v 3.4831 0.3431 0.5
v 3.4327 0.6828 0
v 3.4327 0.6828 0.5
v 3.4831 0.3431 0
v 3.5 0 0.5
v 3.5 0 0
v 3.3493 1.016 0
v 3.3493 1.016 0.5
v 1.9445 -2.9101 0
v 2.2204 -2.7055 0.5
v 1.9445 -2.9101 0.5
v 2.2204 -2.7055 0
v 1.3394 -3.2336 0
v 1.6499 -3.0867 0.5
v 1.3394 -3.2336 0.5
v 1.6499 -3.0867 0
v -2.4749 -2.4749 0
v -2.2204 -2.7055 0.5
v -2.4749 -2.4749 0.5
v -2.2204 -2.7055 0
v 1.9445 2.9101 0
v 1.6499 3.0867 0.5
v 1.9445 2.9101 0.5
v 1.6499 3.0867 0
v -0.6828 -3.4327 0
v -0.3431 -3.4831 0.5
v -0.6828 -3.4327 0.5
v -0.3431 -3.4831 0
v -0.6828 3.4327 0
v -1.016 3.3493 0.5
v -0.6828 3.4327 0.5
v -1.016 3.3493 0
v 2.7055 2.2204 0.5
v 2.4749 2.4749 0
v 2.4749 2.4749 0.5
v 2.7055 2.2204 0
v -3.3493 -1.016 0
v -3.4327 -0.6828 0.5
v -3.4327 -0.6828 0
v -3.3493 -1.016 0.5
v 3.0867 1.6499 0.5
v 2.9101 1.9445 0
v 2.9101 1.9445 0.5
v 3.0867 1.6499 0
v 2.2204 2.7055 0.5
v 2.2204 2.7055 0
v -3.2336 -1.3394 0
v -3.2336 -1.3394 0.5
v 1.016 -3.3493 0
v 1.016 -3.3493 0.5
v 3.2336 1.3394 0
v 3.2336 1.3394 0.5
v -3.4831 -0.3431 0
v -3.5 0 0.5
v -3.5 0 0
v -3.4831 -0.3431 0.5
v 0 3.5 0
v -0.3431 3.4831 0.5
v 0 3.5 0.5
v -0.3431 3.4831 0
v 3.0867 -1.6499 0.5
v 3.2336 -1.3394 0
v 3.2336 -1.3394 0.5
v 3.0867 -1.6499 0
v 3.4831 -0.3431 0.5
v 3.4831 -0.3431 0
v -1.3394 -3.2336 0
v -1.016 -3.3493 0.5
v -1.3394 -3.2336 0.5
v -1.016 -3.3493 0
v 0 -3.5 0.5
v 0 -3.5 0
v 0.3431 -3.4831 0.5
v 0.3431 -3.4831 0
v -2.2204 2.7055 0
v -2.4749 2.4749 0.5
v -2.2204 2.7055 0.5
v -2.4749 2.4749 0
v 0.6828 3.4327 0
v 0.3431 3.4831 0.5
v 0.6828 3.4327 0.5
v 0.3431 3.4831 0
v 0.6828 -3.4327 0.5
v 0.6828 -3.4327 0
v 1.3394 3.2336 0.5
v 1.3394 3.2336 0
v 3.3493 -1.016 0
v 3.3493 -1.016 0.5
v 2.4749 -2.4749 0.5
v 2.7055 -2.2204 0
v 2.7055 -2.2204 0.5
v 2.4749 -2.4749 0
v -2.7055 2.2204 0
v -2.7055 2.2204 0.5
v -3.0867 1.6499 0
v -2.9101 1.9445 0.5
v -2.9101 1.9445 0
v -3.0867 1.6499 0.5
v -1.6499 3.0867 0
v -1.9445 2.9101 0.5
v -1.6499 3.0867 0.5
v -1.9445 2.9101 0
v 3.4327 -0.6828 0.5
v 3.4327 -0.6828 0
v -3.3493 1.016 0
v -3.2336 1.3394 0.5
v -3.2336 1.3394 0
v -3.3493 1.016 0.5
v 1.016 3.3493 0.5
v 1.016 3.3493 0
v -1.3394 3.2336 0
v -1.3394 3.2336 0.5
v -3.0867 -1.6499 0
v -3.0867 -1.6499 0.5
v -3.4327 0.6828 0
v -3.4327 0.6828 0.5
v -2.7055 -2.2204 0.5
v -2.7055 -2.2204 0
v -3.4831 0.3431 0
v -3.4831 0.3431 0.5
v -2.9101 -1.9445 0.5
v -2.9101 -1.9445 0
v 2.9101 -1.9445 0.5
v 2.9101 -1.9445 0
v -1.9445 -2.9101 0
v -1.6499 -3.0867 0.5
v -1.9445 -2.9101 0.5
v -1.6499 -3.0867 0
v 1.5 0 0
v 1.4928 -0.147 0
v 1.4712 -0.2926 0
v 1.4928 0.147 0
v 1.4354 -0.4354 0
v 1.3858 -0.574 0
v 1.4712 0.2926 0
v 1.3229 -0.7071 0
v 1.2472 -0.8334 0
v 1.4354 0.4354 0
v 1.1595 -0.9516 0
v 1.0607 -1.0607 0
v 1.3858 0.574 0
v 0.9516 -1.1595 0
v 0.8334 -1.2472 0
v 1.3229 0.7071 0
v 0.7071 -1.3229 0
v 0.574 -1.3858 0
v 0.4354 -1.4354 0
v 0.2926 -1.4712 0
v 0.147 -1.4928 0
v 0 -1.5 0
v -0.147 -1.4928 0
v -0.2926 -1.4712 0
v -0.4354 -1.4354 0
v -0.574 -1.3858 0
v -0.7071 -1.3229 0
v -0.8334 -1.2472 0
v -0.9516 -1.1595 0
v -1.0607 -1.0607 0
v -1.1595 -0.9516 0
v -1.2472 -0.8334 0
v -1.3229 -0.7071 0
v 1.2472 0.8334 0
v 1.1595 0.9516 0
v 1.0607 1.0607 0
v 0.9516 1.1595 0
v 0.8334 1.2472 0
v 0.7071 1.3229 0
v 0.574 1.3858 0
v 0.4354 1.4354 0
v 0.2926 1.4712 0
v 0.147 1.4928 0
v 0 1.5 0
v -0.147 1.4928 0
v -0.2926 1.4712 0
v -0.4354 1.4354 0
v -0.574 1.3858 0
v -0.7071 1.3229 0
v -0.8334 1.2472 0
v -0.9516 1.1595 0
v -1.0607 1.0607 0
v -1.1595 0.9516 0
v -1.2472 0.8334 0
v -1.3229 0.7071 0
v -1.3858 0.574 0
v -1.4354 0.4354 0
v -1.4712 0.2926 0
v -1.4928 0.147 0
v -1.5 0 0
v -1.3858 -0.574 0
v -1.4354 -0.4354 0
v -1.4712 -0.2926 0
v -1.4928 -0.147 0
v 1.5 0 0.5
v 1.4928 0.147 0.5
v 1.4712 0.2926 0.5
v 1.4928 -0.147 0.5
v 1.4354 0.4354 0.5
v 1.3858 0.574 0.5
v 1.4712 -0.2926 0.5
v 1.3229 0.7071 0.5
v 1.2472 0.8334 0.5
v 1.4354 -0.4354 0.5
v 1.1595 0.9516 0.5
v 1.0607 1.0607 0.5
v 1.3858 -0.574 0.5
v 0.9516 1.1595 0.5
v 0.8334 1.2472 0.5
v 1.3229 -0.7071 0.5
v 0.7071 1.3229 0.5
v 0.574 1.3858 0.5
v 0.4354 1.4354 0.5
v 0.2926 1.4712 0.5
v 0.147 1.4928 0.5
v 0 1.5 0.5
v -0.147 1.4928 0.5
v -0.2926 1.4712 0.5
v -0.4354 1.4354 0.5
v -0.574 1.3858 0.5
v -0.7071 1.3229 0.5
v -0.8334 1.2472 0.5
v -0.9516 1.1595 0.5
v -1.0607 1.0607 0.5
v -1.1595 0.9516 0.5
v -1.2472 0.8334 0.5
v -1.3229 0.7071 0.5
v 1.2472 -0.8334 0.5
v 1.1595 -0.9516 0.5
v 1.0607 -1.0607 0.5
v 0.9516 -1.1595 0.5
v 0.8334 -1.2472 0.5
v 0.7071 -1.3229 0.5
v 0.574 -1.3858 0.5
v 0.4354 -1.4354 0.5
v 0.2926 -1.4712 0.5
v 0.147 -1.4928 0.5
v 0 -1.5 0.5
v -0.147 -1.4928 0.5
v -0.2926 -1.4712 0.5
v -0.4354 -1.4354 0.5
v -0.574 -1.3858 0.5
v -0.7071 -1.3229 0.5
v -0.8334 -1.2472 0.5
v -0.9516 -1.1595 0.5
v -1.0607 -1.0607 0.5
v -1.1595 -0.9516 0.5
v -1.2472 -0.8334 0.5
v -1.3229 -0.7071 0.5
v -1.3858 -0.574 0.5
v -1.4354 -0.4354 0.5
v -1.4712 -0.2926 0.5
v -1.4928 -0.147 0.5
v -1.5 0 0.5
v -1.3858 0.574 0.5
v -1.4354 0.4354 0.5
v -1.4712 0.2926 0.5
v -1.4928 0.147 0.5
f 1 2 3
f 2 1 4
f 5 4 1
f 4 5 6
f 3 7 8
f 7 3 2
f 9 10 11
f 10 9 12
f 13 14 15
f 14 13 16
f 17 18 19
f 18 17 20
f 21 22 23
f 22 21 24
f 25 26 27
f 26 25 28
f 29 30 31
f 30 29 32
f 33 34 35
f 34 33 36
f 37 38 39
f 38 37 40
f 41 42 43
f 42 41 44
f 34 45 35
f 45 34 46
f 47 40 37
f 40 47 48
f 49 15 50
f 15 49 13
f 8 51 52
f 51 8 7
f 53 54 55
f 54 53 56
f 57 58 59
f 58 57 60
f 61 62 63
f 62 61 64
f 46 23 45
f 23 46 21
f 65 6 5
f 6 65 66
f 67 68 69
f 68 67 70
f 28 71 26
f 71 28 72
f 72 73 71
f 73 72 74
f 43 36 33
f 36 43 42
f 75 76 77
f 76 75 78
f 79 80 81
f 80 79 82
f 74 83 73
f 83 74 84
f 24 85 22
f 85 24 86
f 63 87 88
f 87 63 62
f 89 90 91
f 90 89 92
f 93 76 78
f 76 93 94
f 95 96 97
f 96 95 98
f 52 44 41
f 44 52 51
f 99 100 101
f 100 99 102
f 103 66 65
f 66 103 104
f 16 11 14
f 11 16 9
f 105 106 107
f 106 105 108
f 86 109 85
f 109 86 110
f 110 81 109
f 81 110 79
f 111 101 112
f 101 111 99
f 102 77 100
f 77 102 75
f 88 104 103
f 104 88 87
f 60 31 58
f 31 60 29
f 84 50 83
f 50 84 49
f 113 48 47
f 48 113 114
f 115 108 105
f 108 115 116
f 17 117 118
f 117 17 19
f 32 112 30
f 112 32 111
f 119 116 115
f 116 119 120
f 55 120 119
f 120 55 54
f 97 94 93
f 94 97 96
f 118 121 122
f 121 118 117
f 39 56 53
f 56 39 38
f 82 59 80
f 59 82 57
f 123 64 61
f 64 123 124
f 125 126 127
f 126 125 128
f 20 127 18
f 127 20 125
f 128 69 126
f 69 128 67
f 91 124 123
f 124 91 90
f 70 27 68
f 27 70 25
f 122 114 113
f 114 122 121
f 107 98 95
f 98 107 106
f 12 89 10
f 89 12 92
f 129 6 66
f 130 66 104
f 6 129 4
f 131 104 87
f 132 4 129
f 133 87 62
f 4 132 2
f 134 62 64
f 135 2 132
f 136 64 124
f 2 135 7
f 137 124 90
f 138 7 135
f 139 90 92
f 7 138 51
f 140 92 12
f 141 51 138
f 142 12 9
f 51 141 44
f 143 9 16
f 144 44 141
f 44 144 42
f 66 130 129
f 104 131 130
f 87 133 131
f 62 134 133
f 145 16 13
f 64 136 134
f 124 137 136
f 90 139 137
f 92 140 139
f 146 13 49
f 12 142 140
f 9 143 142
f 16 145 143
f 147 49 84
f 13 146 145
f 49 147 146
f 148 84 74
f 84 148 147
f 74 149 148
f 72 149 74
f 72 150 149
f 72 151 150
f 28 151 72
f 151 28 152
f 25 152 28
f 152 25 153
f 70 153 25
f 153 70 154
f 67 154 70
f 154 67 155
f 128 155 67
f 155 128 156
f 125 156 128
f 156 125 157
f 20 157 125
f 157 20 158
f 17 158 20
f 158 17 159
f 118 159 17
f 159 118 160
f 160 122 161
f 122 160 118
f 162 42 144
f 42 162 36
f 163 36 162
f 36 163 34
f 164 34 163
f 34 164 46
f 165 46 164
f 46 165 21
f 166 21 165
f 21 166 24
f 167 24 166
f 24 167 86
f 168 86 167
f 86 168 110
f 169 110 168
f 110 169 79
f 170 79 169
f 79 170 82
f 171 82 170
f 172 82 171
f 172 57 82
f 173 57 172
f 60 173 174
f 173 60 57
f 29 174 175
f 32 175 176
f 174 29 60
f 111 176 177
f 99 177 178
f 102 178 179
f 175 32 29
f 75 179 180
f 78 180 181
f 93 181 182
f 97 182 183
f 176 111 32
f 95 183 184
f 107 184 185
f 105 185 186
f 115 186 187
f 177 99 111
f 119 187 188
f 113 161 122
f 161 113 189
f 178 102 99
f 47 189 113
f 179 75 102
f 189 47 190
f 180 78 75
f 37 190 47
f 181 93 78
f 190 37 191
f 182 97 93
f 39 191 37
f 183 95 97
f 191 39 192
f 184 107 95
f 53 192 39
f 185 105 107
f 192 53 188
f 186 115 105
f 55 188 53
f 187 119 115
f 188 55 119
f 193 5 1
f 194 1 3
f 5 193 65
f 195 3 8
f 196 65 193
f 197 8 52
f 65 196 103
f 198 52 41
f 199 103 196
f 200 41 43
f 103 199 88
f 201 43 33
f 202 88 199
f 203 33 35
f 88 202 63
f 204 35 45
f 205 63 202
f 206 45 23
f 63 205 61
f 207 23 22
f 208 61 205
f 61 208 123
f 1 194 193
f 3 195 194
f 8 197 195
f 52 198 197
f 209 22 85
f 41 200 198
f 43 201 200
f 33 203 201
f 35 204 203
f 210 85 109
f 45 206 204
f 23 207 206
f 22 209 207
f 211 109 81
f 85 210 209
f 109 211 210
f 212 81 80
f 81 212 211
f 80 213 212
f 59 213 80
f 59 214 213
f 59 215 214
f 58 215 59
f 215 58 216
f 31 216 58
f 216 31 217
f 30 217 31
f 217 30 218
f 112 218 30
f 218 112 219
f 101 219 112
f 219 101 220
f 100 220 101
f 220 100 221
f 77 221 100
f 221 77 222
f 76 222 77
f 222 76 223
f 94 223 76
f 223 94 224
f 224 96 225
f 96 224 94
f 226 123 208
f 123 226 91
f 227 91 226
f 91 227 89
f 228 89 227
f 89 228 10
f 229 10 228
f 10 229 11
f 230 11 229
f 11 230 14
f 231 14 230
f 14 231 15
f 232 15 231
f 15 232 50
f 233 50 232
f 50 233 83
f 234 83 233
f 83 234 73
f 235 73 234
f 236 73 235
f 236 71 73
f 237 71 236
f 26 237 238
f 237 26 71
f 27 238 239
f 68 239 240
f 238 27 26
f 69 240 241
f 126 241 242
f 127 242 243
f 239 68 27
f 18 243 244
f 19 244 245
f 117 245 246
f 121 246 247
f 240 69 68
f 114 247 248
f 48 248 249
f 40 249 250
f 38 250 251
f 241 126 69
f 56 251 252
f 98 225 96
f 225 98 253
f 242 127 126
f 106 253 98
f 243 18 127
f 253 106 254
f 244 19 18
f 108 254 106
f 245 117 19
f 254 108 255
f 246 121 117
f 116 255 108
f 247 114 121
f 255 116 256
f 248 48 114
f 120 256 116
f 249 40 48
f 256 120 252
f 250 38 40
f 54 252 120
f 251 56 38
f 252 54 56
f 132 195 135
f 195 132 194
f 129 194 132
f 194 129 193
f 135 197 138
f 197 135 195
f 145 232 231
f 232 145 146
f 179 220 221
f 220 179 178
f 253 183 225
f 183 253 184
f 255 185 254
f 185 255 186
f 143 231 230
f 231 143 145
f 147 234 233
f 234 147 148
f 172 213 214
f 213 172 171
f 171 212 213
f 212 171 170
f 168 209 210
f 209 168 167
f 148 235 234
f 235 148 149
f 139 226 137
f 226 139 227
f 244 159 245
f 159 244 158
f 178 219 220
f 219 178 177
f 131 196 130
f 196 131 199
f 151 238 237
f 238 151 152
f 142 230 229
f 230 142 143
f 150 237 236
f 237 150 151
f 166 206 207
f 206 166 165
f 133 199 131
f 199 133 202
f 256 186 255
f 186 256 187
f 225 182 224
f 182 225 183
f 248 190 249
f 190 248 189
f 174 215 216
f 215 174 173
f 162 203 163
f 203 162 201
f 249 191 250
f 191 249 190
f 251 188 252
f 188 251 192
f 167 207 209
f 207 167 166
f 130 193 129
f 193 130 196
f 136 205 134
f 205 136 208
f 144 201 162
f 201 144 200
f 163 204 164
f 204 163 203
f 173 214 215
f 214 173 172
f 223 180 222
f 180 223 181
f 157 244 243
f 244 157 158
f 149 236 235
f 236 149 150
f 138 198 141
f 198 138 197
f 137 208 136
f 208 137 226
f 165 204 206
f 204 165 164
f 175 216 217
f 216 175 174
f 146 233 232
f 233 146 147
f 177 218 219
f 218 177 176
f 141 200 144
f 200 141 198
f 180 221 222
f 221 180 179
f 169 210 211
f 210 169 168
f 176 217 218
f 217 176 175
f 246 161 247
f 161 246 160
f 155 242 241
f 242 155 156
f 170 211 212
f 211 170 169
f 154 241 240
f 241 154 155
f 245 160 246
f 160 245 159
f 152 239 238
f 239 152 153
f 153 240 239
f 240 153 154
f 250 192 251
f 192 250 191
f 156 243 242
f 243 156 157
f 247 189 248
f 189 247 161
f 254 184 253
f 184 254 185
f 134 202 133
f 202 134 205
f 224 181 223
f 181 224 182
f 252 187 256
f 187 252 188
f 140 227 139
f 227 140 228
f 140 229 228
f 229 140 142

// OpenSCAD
difference() {
    cylinder(d=7.0, h=0.5, $fn=64);
    translate([0, 0, -0.1])
        cylinder(d=3.0, h=0.7, $fn=64);
}
